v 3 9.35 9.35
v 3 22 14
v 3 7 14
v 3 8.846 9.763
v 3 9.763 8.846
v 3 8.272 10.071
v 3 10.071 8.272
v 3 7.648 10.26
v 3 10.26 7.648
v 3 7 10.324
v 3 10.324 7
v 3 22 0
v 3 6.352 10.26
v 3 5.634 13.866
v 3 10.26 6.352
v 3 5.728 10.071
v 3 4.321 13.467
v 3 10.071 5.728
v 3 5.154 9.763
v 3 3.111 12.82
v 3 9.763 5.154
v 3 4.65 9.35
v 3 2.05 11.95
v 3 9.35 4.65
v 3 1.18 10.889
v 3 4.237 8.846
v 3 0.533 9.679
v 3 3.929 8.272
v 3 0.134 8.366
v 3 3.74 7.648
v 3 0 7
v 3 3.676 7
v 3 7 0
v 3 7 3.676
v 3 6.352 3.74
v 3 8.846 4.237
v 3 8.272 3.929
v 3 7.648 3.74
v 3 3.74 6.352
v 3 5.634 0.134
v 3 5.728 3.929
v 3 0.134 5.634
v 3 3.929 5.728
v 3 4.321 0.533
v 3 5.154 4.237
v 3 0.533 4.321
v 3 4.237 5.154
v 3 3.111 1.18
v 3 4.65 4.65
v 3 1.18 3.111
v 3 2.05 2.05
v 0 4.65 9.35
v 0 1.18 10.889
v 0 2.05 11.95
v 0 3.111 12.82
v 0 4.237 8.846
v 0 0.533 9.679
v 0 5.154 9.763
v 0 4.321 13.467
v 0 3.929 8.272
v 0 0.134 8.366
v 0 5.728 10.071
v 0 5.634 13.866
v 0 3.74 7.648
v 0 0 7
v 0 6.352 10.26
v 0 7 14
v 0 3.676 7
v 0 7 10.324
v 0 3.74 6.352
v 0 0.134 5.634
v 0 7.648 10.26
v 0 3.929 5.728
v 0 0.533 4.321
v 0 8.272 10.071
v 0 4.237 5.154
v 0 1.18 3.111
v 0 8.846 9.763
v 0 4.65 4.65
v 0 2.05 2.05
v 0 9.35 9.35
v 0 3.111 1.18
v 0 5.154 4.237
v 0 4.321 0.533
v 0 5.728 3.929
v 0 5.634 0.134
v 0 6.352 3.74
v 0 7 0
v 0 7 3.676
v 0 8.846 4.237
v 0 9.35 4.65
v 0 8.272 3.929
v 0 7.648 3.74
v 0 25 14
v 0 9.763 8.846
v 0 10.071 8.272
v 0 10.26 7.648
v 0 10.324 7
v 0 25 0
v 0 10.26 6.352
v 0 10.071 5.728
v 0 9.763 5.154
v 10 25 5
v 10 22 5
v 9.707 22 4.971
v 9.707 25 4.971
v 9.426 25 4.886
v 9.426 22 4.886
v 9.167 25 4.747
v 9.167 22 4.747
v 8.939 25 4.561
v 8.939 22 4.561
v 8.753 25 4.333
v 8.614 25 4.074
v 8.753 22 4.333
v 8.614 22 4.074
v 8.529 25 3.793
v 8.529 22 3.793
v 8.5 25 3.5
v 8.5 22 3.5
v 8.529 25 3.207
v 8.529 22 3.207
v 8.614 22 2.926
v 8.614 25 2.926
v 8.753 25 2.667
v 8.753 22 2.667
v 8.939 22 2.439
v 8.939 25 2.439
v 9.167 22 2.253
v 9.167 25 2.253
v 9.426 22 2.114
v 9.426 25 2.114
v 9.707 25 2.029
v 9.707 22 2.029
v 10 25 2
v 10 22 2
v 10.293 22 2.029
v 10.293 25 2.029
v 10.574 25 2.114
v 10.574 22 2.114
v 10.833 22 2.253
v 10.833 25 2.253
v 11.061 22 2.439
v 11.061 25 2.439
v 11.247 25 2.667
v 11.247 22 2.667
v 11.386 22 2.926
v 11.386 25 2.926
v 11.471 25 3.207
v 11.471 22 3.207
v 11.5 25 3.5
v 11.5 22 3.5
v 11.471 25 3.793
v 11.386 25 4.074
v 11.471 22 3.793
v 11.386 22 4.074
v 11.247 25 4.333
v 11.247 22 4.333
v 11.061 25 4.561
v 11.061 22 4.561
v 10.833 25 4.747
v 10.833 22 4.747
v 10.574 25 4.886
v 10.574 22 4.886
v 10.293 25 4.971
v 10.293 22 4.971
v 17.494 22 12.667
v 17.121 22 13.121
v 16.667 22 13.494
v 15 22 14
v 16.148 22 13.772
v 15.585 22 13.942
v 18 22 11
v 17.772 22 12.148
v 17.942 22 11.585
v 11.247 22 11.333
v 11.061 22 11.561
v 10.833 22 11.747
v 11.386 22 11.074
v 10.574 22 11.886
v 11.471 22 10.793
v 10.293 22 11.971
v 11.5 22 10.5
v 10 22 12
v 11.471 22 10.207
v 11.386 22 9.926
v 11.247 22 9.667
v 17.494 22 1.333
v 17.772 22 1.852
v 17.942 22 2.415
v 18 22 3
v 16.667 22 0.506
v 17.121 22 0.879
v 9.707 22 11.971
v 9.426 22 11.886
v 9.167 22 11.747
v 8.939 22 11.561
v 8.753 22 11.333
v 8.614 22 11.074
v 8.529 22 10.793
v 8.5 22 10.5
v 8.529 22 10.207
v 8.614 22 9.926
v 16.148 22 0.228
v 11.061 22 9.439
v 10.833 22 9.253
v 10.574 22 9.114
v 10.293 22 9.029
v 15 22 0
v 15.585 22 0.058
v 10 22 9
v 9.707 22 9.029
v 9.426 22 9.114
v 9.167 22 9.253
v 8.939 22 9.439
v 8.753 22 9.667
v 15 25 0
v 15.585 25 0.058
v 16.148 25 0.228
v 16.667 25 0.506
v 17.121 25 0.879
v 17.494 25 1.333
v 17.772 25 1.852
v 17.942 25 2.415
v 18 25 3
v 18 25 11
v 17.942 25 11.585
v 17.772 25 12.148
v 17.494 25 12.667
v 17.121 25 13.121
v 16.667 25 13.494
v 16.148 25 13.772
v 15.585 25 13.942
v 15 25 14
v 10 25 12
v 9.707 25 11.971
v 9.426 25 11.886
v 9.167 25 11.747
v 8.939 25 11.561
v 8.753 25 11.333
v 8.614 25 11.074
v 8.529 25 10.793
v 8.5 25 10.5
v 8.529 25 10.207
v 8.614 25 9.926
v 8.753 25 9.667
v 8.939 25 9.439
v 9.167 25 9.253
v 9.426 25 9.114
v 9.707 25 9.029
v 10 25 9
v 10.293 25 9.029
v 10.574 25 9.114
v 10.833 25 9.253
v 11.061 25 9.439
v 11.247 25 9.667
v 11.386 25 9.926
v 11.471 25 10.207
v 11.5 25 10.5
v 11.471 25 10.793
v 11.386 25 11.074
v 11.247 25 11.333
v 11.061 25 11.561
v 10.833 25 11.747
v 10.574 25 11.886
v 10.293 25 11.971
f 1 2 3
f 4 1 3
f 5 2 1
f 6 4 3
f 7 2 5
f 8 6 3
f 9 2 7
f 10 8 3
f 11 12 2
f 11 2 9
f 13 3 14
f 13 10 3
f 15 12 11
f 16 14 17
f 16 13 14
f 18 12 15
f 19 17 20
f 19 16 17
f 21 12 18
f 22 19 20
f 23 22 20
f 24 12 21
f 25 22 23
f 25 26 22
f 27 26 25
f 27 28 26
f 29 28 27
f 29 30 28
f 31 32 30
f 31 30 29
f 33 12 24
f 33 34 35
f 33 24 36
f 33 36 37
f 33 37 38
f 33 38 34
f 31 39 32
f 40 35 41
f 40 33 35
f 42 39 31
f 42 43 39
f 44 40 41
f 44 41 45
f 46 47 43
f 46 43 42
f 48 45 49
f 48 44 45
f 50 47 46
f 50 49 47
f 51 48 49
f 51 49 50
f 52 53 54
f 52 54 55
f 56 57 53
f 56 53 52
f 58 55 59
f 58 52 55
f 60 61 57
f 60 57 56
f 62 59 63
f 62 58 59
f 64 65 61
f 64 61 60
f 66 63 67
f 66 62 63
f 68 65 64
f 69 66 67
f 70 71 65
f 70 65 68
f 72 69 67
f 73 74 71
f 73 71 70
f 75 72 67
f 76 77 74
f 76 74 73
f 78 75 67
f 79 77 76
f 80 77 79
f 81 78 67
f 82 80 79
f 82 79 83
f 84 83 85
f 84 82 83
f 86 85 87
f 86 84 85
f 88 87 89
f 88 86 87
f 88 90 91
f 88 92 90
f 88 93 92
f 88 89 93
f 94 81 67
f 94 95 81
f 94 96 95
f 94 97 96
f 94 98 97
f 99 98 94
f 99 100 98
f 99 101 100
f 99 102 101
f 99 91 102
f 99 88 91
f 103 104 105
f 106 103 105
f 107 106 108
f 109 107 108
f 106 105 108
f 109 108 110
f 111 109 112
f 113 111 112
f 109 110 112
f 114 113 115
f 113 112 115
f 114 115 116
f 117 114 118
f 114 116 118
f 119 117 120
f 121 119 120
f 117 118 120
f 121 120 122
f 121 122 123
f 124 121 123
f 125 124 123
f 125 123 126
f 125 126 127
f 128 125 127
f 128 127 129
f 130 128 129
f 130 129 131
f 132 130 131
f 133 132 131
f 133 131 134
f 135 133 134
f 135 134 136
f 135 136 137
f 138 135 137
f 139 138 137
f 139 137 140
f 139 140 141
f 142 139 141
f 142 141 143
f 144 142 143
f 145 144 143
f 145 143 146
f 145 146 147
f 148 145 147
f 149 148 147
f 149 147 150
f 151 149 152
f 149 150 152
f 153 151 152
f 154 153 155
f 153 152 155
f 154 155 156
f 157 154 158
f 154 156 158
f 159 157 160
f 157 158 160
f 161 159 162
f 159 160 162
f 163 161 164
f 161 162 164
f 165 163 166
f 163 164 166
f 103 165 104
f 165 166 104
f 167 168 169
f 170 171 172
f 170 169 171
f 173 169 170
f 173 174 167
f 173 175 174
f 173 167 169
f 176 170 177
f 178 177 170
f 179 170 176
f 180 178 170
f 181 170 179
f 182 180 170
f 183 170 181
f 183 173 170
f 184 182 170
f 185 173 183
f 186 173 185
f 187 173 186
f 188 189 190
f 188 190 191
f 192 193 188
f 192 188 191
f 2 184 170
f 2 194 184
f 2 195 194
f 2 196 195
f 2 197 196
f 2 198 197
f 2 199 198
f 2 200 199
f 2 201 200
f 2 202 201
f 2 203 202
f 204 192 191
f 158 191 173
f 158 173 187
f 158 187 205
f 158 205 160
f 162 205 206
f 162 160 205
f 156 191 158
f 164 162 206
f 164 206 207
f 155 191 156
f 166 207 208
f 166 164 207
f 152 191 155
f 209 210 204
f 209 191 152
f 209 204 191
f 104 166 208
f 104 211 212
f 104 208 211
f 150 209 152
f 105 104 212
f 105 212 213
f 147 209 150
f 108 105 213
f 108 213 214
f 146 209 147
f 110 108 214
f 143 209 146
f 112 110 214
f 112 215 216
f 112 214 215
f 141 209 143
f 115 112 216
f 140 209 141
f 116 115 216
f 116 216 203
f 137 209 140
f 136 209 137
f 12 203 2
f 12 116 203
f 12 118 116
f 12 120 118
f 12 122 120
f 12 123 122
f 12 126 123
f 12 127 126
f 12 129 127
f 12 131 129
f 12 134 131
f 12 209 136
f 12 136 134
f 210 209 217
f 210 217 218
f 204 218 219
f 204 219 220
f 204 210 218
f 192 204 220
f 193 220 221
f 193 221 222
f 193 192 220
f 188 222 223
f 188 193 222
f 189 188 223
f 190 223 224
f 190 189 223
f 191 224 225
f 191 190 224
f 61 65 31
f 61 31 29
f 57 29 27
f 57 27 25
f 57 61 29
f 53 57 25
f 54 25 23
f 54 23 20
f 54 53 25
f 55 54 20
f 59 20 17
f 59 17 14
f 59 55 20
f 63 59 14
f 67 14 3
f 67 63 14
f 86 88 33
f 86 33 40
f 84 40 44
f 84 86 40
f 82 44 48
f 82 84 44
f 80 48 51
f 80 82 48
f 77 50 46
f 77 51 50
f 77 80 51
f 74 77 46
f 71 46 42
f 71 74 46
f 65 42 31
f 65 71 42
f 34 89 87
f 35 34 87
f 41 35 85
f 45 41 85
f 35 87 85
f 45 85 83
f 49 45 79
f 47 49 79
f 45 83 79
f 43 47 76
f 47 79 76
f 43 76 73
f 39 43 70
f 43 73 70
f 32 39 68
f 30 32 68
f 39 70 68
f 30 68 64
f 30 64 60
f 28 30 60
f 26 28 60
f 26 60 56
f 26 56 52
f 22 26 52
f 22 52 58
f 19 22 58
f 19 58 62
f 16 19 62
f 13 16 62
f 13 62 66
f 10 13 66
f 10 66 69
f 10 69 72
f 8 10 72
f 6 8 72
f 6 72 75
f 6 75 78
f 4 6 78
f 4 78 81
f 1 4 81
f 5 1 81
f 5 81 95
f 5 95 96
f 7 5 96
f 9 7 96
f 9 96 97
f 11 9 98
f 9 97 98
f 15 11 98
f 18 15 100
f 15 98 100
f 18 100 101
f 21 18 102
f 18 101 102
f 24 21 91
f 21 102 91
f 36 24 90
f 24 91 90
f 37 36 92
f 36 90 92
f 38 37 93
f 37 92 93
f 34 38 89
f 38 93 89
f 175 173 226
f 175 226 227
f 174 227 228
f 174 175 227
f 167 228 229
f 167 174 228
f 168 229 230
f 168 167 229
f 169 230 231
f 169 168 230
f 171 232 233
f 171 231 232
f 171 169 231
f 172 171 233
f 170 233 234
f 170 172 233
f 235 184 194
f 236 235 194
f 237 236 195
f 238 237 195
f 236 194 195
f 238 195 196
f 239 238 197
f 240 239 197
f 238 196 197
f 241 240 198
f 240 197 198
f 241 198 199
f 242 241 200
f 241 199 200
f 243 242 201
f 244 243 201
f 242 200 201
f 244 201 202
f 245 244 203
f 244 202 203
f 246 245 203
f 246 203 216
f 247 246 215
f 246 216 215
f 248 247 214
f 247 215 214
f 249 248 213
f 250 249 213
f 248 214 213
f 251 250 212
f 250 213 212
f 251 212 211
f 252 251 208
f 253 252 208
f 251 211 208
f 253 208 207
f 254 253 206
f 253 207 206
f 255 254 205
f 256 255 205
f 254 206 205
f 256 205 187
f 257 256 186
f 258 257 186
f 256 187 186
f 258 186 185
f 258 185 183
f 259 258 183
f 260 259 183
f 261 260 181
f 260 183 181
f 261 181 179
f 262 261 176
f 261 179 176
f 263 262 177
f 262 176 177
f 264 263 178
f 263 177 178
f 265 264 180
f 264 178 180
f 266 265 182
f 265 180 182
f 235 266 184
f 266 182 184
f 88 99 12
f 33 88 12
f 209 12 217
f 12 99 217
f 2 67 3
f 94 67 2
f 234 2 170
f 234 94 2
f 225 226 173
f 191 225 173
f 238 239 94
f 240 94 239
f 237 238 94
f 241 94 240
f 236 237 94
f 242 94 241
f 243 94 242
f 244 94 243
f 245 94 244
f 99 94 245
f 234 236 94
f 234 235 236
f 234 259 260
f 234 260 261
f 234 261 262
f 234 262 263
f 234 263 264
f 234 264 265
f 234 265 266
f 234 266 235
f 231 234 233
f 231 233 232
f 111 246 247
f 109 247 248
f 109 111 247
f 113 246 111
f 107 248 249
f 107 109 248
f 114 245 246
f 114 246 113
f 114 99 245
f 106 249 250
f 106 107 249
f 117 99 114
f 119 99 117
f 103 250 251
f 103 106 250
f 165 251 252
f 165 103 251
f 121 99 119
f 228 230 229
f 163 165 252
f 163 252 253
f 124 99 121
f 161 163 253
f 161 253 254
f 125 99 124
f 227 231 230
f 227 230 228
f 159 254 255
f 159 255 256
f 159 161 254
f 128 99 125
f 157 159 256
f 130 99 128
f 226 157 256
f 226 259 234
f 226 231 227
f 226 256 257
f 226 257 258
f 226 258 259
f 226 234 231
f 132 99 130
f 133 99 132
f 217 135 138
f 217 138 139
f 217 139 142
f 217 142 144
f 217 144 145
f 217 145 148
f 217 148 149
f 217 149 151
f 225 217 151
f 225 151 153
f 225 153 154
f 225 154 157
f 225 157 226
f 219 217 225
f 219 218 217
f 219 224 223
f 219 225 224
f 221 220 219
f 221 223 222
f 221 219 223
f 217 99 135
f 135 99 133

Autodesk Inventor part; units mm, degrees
ref_plane "YZ Plane" through (0, 0, 0) normal (1, 0, 0) x (0, 1, 0)
ref_plane "XZ Plane" through (0, 0, 0) normal (0, 1, 0) x (-1, 0, 0)
ref_plane "XY Plane" through (0, 0, 0) normal (0, 0, 1) x (1, 0, 0)
sketch "Sketch1" plane through (0, 0, 0) normal (0, 0, 1) x (1, 0, 0)
  line L0 (0, 0) -> (0, 25)
  line L1 (0, 25) -> (18, 25)
  line L2 (18, 25) -> (18, 22)
  line L3 (18, 22) -> (3, 22)
  line L4 (3, 22) -> (3, 0)
  line L5 (3, 0) -> (0, 0)
  dimension "d0" = 25
  dimension "d1" = 3
  dimension "d2" = 3
  dimension "d3" = 15
extrude "Extrusion1" add sketch "Sketch1" along normal blind 14
fillet "Fillet1" radius 7 2 edges at (1.5, 0, 14) (1.5, 0, 0)
sketch "Sketch2" plane through (3, 22, 14) normal (1, 0, 0) x (0, 0, -1)
  line L0 (14, 3) -> (0, 3) projected
  line L1 (0, -15) -> (0, 0) projected
  arc A0 (0, -15) -> (14, -15) centre (7, -15) ccw projected
  line L2 (14, -15) -> (14, 0) projected
  line L3 (14, 0) -> (0, 0) projected
  line L4 (0, -15) -> (0, 0) projected
  point P0 (14, -22)
  point P1 (7, -15)
  dimension "d7" = 18
  dimension "d8" = 7
hole "Hole1" at (3, 7, 7) direction (-1, 0, 0) diameter 6.647 end through all thread size "M8x1.25" class "6H" standard "ANSI Metric M Profile"
sketch "Sketch3" plane through (0, 25, 0) normal (0, 1, 0) x (1, 0, 0)
  line L0 (18, -14) -> (0, -14) projected
  line L1 (0, 0) -> (0, -14) projected
  point P0 (10, -10.5)
  point P1 (10, -3.5)
  dimension "d16" = 7
  dimension "d17" = 3.5
  dimension "d18" = 10
  dimension "d19" = 10
hole "Hole2" at (10, 25, 10.5) at (10, 25, 3.5) direction (0, -1, 0) diameter 3 end through all
fillet "Fillet2" radius 3 2 edges at (18, 23.5, 0) (18, 23.5, 14)
properties part number "HUDSON-1-77"
